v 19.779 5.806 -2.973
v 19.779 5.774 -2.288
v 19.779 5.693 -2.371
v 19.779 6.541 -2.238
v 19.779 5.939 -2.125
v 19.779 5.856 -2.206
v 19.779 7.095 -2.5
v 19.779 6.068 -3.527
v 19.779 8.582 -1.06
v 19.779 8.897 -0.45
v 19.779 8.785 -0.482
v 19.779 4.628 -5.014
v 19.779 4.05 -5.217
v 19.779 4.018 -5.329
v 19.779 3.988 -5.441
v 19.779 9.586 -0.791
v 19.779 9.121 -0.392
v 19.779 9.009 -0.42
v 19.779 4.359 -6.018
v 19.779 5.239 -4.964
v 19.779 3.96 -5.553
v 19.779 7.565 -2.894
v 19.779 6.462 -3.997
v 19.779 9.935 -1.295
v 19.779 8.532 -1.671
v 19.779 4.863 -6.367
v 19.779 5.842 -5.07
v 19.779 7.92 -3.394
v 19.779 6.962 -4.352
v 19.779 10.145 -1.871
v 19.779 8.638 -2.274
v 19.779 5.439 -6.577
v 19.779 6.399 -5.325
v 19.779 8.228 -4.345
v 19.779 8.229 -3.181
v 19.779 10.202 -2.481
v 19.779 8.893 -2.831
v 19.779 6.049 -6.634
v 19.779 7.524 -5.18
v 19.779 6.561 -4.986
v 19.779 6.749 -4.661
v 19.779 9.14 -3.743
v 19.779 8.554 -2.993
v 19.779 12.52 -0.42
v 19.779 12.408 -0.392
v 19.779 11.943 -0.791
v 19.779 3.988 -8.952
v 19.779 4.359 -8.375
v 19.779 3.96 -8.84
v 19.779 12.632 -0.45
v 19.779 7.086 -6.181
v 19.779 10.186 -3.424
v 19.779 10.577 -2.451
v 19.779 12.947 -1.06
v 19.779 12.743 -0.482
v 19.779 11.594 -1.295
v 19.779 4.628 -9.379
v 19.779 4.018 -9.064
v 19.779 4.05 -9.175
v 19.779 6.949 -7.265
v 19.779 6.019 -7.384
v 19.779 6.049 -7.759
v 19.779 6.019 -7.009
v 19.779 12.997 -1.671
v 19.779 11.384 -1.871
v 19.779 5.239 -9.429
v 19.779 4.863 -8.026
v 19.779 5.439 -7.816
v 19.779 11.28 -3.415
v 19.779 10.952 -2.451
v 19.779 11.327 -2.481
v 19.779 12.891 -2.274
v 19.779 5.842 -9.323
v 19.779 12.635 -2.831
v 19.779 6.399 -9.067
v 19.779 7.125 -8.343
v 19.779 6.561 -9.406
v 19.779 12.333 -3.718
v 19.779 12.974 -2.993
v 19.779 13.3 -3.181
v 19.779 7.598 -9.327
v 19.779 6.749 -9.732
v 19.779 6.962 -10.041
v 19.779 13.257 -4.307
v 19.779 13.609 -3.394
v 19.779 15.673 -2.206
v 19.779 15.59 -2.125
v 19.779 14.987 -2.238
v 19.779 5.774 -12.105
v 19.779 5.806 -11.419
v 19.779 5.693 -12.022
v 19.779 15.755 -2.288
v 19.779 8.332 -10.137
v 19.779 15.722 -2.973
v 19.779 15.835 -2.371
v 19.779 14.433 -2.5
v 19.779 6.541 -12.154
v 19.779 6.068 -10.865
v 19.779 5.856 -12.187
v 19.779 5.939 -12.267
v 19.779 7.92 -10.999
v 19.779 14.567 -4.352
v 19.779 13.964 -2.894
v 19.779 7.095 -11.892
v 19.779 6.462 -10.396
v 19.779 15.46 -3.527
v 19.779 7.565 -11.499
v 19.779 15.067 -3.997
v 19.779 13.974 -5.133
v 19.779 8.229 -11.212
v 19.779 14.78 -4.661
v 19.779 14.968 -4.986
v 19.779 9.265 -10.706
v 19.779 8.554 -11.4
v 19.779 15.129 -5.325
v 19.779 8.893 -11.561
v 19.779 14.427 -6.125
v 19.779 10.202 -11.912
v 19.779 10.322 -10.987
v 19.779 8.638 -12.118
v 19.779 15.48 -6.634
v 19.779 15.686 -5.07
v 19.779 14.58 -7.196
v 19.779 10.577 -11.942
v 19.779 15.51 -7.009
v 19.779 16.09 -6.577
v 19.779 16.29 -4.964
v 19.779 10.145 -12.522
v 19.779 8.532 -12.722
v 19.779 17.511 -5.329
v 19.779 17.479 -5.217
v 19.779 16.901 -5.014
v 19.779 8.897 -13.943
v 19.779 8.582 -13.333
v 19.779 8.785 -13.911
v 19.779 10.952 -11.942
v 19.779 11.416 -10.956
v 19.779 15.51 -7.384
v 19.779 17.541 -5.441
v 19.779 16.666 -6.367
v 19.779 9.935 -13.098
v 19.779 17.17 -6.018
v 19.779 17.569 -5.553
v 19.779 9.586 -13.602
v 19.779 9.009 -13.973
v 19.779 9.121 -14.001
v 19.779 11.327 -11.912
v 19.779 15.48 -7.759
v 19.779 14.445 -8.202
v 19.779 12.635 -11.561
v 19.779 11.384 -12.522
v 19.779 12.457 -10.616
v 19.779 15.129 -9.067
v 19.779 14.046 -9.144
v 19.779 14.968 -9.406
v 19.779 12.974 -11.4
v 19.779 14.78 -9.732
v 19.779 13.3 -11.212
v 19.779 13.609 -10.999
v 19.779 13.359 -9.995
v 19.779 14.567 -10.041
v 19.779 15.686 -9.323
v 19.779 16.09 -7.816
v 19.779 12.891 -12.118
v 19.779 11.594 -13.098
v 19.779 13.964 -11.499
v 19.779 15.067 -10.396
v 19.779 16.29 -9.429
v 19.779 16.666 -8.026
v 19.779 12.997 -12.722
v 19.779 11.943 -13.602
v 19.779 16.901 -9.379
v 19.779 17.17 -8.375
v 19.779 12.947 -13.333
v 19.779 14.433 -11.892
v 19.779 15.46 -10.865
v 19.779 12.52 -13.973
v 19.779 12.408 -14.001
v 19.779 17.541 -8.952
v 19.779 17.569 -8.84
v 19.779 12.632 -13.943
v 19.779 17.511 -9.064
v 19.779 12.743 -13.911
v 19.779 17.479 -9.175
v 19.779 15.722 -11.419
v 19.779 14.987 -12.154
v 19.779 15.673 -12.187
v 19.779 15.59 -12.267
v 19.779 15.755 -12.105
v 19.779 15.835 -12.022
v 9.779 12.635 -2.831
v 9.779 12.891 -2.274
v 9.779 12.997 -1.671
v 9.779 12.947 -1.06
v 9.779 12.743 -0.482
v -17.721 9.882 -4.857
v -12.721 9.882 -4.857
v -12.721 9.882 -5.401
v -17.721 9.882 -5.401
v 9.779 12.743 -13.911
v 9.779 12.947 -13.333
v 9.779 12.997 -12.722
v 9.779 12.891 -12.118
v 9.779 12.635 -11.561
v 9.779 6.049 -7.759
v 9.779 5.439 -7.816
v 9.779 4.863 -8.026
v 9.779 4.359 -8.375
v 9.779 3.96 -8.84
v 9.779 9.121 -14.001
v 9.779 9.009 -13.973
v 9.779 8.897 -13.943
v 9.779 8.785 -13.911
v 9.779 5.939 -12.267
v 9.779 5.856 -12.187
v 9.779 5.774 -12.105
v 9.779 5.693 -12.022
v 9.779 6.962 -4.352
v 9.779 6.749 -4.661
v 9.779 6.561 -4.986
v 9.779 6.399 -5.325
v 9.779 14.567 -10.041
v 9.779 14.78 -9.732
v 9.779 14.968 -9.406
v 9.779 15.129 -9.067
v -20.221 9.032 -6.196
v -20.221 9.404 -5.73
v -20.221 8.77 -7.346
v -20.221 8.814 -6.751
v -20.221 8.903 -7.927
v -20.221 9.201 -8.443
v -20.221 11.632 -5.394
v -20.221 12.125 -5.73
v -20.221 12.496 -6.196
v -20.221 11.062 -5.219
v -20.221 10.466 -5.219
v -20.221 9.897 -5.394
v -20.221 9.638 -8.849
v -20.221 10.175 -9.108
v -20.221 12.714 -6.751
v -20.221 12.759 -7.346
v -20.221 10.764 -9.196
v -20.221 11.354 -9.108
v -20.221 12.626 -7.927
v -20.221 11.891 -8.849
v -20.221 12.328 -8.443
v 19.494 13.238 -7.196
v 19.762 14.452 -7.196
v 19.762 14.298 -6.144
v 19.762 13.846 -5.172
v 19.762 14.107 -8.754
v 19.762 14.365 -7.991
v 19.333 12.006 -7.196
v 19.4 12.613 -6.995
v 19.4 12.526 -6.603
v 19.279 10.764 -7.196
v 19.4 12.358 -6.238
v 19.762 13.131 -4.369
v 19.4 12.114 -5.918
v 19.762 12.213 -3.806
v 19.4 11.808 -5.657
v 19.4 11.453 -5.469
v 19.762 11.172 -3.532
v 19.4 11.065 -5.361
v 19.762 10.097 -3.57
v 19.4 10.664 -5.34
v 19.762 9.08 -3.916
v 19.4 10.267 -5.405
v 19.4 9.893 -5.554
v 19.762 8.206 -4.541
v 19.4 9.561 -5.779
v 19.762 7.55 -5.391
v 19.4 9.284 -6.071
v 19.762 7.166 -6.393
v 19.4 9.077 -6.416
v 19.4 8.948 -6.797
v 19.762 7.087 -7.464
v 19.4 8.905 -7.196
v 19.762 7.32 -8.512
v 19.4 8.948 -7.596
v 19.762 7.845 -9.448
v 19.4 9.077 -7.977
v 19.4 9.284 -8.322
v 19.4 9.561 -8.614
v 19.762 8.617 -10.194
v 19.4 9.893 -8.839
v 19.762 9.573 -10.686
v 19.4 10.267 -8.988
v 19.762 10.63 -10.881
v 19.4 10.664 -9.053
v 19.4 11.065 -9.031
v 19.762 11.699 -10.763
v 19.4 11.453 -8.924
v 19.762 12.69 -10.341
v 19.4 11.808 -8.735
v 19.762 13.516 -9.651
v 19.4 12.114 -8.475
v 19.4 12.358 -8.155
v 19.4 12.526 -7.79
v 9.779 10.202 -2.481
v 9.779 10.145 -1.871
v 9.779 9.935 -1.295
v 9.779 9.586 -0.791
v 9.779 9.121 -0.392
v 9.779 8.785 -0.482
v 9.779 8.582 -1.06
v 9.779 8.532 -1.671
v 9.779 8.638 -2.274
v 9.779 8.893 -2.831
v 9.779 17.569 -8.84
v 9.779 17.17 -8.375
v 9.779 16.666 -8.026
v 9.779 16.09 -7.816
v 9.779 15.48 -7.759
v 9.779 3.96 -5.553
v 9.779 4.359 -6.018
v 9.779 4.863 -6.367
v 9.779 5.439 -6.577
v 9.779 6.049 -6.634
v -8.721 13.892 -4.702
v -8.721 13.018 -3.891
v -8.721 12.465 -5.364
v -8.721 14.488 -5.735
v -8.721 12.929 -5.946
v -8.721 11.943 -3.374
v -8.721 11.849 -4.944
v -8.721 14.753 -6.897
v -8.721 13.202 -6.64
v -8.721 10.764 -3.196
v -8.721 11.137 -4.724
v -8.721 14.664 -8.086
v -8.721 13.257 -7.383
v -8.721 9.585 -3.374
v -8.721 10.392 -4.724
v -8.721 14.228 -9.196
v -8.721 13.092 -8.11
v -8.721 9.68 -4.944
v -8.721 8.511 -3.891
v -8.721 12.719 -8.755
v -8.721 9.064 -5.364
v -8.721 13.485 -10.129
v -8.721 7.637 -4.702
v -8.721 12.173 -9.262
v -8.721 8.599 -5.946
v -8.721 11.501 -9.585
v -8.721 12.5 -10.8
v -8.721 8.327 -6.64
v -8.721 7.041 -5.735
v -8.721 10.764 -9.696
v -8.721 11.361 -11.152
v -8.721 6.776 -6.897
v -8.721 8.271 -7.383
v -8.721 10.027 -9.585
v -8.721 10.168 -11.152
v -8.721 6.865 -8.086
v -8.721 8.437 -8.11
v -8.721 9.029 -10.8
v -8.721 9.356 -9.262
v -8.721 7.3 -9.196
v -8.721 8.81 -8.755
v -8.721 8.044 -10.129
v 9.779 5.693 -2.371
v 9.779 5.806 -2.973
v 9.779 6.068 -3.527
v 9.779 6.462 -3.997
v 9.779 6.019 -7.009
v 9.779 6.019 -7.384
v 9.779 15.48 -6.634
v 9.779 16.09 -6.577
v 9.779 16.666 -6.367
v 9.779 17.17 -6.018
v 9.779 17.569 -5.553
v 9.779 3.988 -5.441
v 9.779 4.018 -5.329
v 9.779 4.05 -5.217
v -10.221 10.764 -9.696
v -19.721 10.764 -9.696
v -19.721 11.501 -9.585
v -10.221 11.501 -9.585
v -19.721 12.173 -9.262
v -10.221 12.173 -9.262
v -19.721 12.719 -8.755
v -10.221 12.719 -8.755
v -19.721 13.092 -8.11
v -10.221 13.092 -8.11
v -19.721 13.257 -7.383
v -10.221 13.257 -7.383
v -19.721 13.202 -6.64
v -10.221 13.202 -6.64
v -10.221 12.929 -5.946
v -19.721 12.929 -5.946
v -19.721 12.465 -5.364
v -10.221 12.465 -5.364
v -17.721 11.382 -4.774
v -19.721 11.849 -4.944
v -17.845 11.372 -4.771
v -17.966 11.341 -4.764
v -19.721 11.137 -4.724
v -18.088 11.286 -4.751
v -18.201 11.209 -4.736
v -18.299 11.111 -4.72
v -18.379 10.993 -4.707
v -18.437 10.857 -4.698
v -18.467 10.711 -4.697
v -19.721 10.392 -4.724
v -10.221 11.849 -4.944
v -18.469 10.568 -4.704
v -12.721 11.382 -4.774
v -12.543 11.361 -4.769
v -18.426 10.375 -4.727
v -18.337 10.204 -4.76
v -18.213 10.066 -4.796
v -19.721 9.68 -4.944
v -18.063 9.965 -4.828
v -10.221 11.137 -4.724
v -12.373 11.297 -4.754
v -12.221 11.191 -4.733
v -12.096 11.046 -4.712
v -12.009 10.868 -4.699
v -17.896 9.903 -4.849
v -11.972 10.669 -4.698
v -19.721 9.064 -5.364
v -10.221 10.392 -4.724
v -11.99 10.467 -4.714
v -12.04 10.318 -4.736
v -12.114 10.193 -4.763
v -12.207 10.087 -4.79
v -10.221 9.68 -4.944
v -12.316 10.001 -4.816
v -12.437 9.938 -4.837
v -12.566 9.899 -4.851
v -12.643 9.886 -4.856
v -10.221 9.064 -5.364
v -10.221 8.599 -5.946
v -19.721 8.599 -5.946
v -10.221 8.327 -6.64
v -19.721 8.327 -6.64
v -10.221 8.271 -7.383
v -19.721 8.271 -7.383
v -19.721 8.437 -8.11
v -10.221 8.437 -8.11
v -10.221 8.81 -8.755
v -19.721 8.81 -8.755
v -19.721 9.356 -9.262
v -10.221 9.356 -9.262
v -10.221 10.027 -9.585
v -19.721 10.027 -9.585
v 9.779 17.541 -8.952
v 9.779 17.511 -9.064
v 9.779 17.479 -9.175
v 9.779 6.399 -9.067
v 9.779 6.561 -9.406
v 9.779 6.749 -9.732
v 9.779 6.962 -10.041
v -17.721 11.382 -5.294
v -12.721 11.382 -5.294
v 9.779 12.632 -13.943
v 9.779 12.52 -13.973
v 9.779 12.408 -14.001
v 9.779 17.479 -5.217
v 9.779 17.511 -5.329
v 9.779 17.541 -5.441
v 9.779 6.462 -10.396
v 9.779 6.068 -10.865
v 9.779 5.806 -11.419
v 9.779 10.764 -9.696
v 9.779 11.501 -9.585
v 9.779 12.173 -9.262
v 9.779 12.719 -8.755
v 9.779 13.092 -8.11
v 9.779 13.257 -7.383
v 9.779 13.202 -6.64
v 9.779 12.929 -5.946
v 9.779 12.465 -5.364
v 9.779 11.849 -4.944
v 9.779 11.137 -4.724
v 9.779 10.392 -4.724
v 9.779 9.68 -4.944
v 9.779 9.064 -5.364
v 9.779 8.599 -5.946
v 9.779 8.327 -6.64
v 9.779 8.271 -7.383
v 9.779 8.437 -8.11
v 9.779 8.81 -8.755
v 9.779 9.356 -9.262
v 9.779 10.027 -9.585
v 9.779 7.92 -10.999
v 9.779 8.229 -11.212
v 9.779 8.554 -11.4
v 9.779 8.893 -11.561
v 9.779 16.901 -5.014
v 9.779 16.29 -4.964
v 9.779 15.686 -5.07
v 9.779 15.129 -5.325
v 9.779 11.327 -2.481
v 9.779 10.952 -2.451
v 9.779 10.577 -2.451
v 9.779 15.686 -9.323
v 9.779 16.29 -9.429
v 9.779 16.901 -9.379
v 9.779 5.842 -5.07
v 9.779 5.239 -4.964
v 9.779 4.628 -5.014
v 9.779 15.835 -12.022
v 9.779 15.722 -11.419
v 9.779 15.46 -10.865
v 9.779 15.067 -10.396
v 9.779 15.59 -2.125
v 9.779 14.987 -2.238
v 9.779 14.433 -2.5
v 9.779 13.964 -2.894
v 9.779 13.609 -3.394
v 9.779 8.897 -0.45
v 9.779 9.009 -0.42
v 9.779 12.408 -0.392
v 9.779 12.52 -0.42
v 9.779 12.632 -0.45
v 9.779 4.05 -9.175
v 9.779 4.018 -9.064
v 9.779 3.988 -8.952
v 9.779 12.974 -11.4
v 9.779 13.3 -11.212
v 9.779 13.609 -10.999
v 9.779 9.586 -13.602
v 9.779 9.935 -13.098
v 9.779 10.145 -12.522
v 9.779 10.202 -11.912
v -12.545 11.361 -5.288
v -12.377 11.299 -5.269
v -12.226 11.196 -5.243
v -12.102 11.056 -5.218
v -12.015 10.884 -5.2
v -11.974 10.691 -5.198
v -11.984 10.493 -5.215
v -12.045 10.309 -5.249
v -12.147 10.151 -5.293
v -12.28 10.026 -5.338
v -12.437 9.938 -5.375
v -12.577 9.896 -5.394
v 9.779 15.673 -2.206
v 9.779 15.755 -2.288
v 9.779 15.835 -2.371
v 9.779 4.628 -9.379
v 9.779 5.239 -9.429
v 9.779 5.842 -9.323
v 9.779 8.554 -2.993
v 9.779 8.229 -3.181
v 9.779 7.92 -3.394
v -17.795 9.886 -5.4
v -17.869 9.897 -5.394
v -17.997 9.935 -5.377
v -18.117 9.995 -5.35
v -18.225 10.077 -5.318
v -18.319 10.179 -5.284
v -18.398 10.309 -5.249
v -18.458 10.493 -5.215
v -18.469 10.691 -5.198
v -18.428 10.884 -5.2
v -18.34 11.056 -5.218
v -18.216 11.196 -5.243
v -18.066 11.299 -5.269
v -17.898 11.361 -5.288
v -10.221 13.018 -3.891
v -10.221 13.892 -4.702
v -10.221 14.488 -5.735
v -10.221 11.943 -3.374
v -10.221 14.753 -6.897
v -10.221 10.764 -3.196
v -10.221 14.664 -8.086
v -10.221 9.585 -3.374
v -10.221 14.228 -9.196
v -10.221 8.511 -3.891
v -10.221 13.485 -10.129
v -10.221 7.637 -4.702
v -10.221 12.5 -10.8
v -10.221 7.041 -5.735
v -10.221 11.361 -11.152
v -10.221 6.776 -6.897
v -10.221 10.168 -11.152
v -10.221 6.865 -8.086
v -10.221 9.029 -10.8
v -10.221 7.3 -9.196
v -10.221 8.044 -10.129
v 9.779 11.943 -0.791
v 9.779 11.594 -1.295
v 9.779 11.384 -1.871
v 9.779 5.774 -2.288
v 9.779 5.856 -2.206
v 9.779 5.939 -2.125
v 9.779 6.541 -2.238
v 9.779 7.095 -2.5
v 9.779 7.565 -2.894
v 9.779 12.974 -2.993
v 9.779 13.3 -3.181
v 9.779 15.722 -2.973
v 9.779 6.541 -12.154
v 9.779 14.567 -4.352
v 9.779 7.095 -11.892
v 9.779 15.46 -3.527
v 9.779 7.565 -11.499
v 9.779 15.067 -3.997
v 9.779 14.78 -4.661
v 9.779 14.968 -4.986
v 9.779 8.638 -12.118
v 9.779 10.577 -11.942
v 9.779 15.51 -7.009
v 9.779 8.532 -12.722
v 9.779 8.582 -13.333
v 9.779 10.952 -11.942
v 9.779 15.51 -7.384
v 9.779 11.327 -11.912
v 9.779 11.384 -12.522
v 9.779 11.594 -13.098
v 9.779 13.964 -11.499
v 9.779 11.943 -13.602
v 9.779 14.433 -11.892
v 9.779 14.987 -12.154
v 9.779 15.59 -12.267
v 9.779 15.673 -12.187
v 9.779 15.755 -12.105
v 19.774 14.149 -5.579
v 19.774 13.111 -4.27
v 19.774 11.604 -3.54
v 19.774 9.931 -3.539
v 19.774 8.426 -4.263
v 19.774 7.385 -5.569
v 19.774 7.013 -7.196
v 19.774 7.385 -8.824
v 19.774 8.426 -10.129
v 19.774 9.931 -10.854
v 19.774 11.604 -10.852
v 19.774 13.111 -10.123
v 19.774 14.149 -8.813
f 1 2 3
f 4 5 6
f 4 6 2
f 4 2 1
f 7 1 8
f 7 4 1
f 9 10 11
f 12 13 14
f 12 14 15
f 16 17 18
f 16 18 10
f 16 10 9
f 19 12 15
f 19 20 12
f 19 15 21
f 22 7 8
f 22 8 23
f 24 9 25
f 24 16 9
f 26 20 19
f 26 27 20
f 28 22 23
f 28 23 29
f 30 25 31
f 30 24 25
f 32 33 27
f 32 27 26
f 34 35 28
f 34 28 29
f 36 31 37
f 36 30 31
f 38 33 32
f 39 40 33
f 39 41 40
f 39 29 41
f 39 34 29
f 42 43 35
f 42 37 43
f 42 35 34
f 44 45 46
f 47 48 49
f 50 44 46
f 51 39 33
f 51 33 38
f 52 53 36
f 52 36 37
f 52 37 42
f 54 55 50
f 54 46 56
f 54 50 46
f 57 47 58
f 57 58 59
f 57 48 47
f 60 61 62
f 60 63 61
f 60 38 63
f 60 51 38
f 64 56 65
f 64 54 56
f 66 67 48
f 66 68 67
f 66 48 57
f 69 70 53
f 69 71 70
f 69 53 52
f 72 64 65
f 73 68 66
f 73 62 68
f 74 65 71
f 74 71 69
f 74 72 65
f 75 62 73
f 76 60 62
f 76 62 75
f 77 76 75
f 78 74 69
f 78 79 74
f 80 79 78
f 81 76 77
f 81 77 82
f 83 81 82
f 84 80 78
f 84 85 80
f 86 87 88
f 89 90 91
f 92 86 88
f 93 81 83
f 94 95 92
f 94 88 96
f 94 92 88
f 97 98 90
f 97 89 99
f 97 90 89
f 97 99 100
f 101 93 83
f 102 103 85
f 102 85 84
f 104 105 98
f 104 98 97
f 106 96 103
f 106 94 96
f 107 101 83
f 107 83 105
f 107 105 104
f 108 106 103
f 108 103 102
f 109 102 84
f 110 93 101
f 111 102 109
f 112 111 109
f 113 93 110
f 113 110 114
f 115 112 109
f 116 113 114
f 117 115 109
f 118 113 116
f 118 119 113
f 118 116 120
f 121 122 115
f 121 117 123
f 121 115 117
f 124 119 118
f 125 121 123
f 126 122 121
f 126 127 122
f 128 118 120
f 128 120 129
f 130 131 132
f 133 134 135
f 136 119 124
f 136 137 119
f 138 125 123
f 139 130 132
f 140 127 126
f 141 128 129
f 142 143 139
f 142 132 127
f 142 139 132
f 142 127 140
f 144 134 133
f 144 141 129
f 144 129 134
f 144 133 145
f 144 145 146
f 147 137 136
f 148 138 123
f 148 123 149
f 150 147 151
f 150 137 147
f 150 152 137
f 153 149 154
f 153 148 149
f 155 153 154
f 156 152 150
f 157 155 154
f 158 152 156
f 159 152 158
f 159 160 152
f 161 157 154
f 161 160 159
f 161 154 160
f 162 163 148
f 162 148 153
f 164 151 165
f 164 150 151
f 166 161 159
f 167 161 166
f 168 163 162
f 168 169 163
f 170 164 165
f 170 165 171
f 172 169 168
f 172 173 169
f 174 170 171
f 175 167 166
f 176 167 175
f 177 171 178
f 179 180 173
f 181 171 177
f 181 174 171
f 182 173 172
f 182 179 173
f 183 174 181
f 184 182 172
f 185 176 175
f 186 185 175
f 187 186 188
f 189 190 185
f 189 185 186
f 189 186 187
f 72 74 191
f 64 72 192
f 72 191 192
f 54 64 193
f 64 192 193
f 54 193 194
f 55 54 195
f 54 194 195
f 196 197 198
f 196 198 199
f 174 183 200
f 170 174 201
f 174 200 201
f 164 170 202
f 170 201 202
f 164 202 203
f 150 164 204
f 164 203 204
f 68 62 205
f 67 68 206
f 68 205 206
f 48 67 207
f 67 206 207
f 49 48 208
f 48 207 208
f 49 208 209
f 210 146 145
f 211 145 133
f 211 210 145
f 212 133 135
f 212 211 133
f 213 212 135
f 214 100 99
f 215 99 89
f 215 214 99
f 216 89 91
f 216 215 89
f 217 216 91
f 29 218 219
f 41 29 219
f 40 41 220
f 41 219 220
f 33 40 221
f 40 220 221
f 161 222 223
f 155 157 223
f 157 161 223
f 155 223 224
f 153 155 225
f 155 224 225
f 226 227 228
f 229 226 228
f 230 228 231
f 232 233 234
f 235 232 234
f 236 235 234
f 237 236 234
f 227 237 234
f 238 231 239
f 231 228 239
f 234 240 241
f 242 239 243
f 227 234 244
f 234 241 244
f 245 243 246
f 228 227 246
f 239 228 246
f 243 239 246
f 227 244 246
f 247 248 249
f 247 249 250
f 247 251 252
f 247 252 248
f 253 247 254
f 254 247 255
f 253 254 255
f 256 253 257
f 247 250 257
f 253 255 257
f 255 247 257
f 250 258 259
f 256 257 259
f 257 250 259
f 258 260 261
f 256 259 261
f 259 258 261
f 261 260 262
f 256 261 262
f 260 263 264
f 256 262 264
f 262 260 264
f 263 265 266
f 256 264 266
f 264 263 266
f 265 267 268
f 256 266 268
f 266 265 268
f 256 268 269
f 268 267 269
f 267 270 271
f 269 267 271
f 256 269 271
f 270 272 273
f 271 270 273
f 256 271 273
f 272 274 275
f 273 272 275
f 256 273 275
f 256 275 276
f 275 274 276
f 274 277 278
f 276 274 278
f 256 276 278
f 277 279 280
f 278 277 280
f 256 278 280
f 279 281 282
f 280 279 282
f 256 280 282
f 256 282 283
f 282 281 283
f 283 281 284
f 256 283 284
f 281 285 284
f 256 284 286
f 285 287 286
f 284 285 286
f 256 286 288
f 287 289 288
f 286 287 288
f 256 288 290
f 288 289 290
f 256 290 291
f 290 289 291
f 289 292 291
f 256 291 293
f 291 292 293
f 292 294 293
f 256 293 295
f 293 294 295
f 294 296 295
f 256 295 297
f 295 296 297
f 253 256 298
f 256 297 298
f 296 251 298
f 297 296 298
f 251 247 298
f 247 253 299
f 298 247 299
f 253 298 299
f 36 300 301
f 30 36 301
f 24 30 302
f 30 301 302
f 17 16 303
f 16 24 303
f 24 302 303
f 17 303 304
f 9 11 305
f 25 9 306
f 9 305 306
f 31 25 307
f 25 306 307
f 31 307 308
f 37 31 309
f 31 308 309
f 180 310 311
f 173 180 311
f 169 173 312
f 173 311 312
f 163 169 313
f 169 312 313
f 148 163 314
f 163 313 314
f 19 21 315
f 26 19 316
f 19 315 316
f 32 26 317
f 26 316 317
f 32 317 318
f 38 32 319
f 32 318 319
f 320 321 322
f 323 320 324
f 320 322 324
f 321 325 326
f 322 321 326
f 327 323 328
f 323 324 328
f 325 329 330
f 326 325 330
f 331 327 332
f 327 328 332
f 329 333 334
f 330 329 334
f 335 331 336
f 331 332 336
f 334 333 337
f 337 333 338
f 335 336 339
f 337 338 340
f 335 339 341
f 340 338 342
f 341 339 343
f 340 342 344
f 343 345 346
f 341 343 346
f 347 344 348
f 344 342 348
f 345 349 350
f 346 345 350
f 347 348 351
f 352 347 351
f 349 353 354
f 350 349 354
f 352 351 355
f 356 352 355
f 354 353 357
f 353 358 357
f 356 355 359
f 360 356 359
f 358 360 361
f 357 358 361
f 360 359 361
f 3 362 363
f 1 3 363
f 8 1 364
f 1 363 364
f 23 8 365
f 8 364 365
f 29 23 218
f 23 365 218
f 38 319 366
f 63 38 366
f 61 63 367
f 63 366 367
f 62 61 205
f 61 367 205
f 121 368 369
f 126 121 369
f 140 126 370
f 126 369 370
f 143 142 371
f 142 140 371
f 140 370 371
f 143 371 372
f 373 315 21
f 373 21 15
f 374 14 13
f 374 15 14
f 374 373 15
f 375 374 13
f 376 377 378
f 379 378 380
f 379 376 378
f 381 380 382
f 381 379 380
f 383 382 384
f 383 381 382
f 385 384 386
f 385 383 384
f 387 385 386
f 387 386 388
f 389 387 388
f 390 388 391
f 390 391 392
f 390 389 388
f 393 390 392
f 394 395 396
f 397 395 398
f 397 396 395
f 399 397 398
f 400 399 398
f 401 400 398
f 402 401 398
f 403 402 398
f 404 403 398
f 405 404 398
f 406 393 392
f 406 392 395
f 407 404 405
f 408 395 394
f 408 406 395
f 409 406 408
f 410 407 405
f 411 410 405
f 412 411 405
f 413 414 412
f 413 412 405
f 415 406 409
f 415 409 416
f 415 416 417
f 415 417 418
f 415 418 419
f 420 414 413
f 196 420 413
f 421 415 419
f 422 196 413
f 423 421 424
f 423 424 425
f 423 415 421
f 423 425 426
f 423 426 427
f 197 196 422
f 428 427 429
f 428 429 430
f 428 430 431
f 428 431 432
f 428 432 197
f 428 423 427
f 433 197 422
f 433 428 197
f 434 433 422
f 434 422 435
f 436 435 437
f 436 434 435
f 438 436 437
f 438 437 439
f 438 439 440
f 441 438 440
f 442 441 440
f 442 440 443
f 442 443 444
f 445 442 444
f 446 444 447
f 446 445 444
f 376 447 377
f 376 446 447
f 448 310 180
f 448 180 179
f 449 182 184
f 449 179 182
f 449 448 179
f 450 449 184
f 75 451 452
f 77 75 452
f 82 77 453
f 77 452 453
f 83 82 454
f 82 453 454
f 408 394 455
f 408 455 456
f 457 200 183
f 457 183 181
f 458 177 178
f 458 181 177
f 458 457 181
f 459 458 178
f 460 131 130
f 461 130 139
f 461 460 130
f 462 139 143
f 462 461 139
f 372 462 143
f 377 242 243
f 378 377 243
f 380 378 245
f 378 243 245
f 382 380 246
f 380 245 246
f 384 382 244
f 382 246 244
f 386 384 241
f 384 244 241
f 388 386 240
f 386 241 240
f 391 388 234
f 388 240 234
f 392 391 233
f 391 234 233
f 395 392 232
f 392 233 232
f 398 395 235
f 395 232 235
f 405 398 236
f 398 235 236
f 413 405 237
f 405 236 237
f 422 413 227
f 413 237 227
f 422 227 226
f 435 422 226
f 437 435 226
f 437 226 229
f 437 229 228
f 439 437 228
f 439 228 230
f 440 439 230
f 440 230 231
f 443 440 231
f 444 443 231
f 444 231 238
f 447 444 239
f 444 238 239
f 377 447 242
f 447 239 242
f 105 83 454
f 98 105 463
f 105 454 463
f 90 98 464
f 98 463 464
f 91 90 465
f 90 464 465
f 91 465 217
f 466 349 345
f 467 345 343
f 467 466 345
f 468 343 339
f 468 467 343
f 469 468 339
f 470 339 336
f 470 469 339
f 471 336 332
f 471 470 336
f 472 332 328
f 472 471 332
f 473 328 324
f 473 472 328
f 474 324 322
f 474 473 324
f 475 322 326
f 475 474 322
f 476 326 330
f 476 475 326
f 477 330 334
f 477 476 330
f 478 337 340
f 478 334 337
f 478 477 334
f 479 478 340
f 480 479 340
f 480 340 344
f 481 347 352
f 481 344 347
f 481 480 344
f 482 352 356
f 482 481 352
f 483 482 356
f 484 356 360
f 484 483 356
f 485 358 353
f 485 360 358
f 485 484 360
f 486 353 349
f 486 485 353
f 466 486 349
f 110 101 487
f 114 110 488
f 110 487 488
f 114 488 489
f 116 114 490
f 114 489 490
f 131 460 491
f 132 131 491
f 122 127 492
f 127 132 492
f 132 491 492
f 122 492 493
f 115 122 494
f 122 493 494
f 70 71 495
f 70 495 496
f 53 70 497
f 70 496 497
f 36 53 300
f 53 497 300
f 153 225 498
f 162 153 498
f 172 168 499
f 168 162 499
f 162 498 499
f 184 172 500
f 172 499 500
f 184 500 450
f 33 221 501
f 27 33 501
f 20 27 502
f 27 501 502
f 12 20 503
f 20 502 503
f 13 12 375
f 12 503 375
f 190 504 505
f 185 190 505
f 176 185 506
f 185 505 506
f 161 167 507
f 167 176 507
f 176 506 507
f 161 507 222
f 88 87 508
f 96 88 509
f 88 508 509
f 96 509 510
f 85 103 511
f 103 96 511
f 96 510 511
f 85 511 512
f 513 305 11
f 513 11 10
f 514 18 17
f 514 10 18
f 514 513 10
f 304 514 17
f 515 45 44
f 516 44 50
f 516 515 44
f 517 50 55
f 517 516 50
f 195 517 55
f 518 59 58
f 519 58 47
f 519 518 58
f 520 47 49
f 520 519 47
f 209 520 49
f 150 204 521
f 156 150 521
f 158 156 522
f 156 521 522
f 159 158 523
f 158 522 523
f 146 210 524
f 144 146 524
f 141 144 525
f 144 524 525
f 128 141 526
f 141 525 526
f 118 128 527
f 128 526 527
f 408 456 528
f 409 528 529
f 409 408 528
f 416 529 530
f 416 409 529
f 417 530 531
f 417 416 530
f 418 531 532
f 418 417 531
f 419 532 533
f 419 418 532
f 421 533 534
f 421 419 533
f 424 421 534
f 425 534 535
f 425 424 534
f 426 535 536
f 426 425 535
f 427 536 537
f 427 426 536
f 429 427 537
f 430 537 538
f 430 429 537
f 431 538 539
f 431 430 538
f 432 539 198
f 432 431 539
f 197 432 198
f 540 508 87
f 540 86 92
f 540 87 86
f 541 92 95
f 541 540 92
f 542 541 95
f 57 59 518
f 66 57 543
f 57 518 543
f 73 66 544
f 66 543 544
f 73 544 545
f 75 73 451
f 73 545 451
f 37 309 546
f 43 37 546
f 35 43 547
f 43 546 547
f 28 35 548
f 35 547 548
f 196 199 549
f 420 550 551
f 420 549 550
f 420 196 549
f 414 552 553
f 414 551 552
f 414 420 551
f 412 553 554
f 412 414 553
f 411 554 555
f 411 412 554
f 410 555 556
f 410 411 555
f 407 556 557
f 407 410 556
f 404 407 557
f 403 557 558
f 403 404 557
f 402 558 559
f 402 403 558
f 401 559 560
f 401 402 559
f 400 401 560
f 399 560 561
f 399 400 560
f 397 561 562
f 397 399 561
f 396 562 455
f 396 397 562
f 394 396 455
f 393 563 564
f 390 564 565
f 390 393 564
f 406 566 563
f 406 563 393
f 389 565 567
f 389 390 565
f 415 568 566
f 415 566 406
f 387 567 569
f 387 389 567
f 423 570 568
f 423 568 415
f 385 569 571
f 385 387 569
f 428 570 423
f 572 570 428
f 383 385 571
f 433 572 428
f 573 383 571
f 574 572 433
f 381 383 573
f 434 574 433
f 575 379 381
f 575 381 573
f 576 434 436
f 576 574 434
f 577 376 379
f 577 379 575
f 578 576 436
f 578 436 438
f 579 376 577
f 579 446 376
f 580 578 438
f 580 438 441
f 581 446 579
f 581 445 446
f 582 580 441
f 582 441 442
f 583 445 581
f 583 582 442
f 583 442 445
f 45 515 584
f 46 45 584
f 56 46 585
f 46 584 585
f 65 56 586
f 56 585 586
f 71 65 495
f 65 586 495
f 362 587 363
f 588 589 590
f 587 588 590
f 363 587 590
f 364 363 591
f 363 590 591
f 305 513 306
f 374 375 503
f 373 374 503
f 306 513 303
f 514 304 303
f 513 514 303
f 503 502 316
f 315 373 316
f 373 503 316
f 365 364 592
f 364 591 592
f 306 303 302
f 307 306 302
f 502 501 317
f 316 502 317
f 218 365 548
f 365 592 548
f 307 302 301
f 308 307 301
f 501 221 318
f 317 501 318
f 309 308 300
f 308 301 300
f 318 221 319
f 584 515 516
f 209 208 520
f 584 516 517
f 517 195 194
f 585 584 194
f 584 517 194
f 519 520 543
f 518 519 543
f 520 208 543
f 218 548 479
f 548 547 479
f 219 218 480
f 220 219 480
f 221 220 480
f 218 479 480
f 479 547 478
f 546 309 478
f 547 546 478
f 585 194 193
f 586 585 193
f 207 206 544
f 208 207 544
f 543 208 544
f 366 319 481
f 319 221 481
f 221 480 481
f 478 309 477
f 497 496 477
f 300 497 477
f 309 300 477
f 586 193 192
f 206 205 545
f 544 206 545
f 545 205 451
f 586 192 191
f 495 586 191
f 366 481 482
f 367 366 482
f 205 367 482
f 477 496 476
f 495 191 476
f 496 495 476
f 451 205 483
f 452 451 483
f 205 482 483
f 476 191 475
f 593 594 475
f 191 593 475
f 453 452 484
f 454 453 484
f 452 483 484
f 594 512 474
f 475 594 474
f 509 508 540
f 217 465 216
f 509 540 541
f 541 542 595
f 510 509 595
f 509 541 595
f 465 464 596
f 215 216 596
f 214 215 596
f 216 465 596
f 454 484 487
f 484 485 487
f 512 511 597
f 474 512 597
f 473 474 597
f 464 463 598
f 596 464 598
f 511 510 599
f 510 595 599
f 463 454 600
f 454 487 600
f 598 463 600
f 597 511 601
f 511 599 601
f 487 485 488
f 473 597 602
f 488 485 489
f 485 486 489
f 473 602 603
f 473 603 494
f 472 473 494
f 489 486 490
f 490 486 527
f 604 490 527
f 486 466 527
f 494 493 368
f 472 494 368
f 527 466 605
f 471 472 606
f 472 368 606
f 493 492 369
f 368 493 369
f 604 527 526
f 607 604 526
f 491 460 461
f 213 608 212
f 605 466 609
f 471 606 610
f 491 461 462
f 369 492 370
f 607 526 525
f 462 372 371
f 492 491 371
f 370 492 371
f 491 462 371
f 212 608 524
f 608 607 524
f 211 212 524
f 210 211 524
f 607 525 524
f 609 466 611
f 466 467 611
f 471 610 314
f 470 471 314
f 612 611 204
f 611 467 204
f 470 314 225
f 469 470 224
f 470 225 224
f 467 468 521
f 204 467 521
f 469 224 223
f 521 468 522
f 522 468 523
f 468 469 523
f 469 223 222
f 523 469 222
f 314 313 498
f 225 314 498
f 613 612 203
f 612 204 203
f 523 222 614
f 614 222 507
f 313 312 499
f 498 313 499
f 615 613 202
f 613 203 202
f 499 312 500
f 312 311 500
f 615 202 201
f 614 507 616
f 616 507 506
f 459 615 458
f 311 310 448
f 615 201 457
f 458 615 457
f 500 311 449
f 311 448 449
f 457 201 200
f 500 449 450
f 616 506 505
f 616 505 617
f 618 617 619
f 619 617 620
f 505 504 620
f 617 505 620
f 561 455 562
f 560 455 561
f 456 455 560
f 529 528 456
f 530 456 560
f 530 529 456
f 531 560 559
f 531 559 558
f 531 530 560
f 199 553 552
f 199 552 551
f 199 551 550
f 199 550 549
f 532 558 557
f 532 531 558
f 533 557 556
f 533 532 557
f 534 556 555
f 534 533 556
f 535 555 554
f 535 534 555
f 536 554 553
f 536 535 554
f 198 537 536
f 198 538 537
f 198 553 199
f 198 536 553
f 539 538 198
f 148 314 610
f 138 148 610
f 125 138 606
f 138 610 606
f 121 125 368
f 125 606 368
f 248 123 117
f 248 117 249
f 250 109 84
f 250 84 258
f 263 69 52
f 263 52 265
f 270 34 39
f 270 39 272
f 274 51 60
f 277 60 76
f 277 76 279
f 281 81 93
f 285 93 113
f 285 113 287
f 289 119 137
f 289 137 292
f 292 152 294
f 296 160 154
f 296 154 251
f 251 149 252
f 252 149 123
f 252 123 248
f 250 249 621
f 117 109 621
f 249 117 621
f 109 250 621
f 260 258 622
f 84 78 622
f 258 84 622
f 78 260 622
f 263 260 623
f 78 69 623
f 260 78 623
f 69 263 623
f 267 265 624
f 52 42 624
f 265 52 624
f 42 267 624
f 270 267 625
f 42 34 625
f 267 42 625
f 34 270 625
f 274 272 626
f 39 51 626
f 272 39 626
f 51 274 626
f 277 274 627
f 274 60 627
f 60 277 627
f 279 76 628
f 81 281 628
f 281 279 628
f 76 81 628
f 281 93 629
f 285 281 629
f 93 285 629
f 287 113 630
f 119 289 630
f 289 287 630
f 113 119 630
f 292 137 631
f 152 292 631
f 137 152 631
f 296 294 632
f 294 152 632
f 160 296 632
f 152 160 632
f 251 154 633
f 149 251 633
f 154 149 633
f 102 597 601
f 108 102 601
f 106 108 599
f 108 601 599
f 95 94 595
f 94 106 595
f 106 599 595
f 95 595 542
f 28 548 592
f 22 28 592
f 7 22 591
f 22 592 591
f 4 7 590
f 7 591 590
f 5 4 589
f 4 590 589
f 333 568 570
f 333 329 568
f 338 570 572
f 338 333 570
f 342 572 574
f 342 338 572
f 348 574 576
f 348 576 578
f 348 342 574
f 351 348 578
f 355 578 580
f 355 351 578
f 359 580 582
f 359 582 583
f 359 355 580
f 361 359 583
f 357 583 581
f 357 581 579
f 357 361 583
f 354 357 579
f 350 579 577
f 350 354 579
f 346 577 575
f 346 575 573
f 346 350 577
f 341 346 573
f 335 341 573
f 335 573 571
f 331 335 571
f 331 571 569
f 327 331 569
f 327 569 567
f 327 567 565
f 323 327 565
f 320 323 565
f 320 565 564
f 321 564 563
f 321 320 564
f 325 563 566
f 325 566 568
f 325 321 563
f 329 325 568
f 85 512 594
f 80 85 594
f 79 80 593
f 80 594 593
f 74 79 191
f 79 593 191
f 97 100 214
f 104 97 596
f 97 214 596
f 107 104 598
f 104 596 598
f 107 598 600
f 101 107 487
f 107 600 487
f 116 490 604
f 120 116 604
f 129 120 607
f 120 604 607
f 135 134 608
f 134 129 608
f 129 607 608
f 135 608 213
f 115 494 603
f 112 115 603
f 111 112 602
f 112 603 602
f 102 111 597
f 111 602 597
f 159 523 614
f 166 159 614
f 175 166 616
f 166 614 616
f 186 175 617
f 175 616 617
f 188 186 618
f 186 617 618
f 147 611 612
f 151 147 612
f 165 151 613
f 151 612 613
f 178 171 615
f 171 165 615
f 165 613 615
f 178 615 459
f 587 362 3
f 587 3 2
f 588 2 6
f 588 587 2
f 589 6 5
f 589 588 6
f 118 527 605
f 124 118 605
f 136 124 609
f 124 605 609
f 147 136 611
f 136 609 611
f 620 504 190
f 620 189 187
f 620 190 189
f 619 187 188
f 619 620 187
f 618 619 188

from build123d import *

# Parameters (mm, degrees)
SKETCH1_W                  = 10
SKETCH1_H                  = 7
CUT_EXTRUDE1_DEPTH         = 25.841675415
CUT_EXTRUDE2_DEPTH         = 25.841675415
CUT_EXTRUDE3_DEPTH         = 25.841675415
CUT_EXTRUDE4_DEPTH         = 25.841675415
CUT_EXTRUDE5_DEPTH         = 25.841675415
CUT_EXTRUDE6_DEPTH         = 25.841675415
CUT_EXTRUDE7_DEPTH         = 25.841675415
CUT_EXTRUDE8_DEPTH         = 25.841675415
CUT_EXTRUDE9_DEPTH         = 25.73038126
CUT_EXTRUDE10_DEPTH        = 25.73038126
CUT_EXTRUDE11_DEPTH        = 25.73038126
CUT_EXTRUDE12_DEPTH        = 25.590210189
SKETCH14_W                 = 30.0000508
SKETCH14_H                 = 2.5
F_0_8_0_8_DIAMETER_HOLE1_D = 0.8
BOSS_EXTRUDE1_START        = -40.0000508
SKETCH17_R                 = 0.4
BOSS_EXTRUDE1_DEPTH        = 40.0000508
SKETCH18_W                 = 1.5
SKETCH18_H                 = 1.5
CHAMFER1_SIZE              = 0.5
CUT_EXTRUDE13_REACH        = 34.638
CUT_EXTRUDE13_END_RADIUS   = 2
CUT_EXTRUDE13_START        = 5
FILLET1_R                  = 0.5


# Read off the part's stored shape, not the designer's step: Dome1
with BuildPart() as part:
    # Sketch1 → Revolve1 (revolve)
    with BuildSketch(Plane(origin=(0, 0, -7.196357143), x_dir=(-1, 0, 0), z_dir=(0, 0, -1)), mode=Mode.PRIVATE) as revolve1_sk:
        with Locations((-14.77870785, 14.264354232)):
            Rectangle(SKETCH1_W, SKETCH1_H)
    revolve(revolve1_sk.sketch.rotate(Axis((19.77870785, 10.764354232, -7.196357143), (-1, 0, 0)), 270), axis=Axis((19.77870785, 10.764354232, -7.196357143), (-1, 0, 0)))

    # Sketch2 → Cut-Extrude1 (cut, through all)
    with BuildSketch(Plane.ZY.offset(-9.77870785)):
        with BuildLine():
            ThreePointArc((-0.481894482, 12.743240579), (-1.134179317, 14.264354232), (-2.125359964, 15.589806295))
            ThreePointArc((-2.125359964, 15.589806295), (-2.500220073, 14.433413298), (-3.393627672, 13.609042188))
            ThreePointArc((-3.393627672, 13.609042188), (-3.083602501, 13.138854232), (-2.831420372, 12.635270579))
            ThreePointArc((-2.831420372, 12.635270579), (-1.670790249, 12.996798701), (-0.481894482, 12.743240579))
        make_face()
    extrude(amount=-CUT_EXTRUDE1_DEPTH, mode=Mode.SUBTRACT)

    # Sketch3 → Cut-Extrude2 (cut, through all)
    with BuildSketch(Plane.ZY.offset(-9.77870785)):
        with BuildLine():
            ThreePointArc((-0.392018732, 9.12088875), (-0.196357143, 10.764354232), (-0.392018732, 12.407819713))
            ThreePointArc((-0.392018732, 12.407819713), (-1.294853608, 11.593784056), (-2.480752839, 11.326561532))
            ThreePointArc((-2.480752839, 11.326561532), (-2.447357143, 10.764354232), (-2.480752839, 10.202146931))
            ThreePointArc((-2.480752839, 10.202146931), (-1.294853608, 9.934924408), (-0.392018732, 9.12088875))
        make_face()
    extrude(amount=-CUT_EXTRUDE2_DEPTH, mode=Mode.SUBTRACT)

    # Sketch4 → Cut-Extrude3 (cut, through all)
    with BuildSketch(Plane.ZY.offset(-9.77870785)):
        with BuildLine():
            ThreePointArc((-2.125359964, 5.938902169), (-1.134179317, 7.264354232), (-0.481894482, 8.785467884))
            ThreePointArc((-0.481894482, 8.785467884), (-1.670790249, 8.531909762), (-2.831420372, 8.893437884))
            ThreePointArc((-2.831420372, 8.893437884), (-3.083602501, 8.389854232), (-3.393627672, 7.919666275))
            ThreePointArc((-3.393627672, 7.919666275), (-2.500220073, 7.095295166), (-2.125359964, 5.938902169))
        make_face()
    extrude(amount=-CUT_EXTRUDE3_DEPTH, mode=Mode.SUBTRACT)

    # Sketch5 → Cut-Extrude4 (cut, through all)
    with BuildSketch(Plane.ZY.offset(-9.77870785)):
        with BuildLine():
            ThreePointArc((-5.217470795, 4.049891571), (-3.696357143, 4.702176405), (-2.37090508, 5.693357053))
            ThreePointArc((-2.37090508, 5.693357053), (-3.527298077, 6.068217161), (-4.351669187, 6.96162476))
            ThreePointArc((-4.351669187, 6.96162476), (-4.821857143, 6.651599589), (-5.325440796, 6.39941746))
            ThreePointArc((-5.325440796, 6.39941746), (-4.963912674, 5.238787337), (-5.217470795, 4.049891571))
        make_face()
    extrude(amount=-CUT_EXTRUDE4_DEPTH, mode=Mode.SUBTRACT)

    # Sketch6 → Cut-Extrude5 (cut, through all)
    with BuildSketch(Plane.ZY.offset(-9.77870785)):
        with BuildLine():
            ThreePointArc((-8.839822625, 3.960015821), (-7.196357143, 3.764354232), (-5.552891661, 3.960015821))
            ThreePointArc((-5.552891661, 3.960015821), (-6.366927319, 4.862850696), (-6.634149843, 6.048749928))
            ThreePointArc((-6.634149843, 6.048749928), (-7.196357143, 6.015354232), (-7.758564444, 6.048749928))
            ThreePointArc((-7.758564444, 6.048749928), (-8.025786967, 4.862850696), (-8.839822625, 3.960015821))
        make_face()
    extrude(amount=-CUT_EXTRUDE5_DEPTH, mode=Mode.SUBTRACT)

    # Sketch7 → Cut-Extrude6 (cut, through all)
    with BuildSketch(Plane.ZY.offset(-9.77870785)):
        with BuildLine():
            ThreePointArc((-12.021809206, 5.693357053), (-10.696357143, 4.702176405), (-9.175243491, 4.049891571))
            ThreePointArc((-9.175243491, 4.049891571), (-9.428801613, 5.238787337), (-9.067273491, 6.39941746))
            ThreePointArc((-9.067273491, 6.39941746), (-9.570857143, 6.651599589), (-10.0410451, 6.96162476))
            ThreePointArc((-10.0410451, 6.96162476), (-10.865416209, 6.068217161), (-12.021809206, 5.693357053))
        make_face()
    extrude(amount=-CUT_EXTRUDE6_DEPTH, mode=Mode.SUBTRACT)

    # Sketch8 → Cut-Extrude7 (cut, through all)
    with BuildSketch(Plane.ZY.offset(-9.77870785)):
        with BuildLine():
            ThreePointArc((-13.910819804, 8.785467884), (-13.25853497, 7.264354232), (-12.267354322, 5.938902169))
            ThreePointArc((-12.267354322, 5.938902169), (-11.892494213, 7.095295166), (-10.999086614, 7.919666275))
            ThreePointArc((-10.999086614, 7.919666275), (-11.309111786, 8.389854232), (-11.561293915, 8.893437884))
            ThreePointArc((-11.561293915, 8.893437884), (-12.721924037, 8.531909762), (-13.910819804, 8.785467884))
        make_face()
    extrude(amount=-CUT_EXTRUDE7_DEPTH, mode=Mode.SUBTRACT)

    # Sketch9 → Cut-Extrude8 (cut, through all)
    with BuildSketch(Plane.ZY.offset(-9.77870785)):
        with BuildLine():
            ThreePointArc((-14.000695554, 12.407819713), (-14.196357143, 10.764354232), (-14.000695554, 9.12088875))
            ThreePointArc((-14.000695554, 9.12088875), (-13.097860679, 9.934924408), (-11.911961447, 10.202146931))
            ThreePointArc((-11.911961447, 10.202146931), (-11.945357143, 10.764354232), (-11.911961447, 11.326561532))
            ThreePointArc((-11.911961447, 11.326561532), (-13.097860679, 11.593784056), (-14.000695554, 12.407819713))
        make_face()
    extrude(amount=-CUT_EXTRUDE8_DEPTH, mode=Mode.SUBTRACT)

    # Sketch10 → Cut-Extrude9 (cut, through all)
    with BuildSketch(Plane.ZY.offset(-9.77870785)):
        with BuildLine():
            ThreePointArc((-12.267354322, 15.589806295), (-13.25853497, 14.264354232), (-13.910819804, 12.743240579))
            ThreePointArc((-13.910819804, 12.743240579), (-12.721924037, 12.996798701), (-11.561293915, 12.635270579))
            ThreePointArc((-11.561293915, 12.635270579), (-11.309111786, 13.138854232), (-10.999086614, 13.609042188))
            ThreePointArc((-10.999086614, 13.609042188), (-11.892494213, 14.433413298), (-12.267354322, 15.589806295))
        make_face()
    extrude(amount=-CUT_EXTRUDE9_DEPTH, mode=Mode.SUBTRACT)

    # Sketch11 → Cut-Extrude10 (cut, through all)
    with BuildSketch(Plane.ZY.offset(-9.77870785)):
        with BuildLine():
            ThreePointArc((-9.175243491, 17.478816892), (-10.696357143, 16.826532058), (-12.021809206, 15.83535141))
            ThreePointArc((-12.021809206, 15.83535141), (-10.865416209, 15.460491302), (-10.0410451, 14.567083703))
            ThreePointArc((-10.0410451, 14.567083703), (-9.570857143, 14.877108874), (-9.067273491, 15.129291003))
            ThreePointArc((-9.067273491, 15.129291003), (-9.428801613, 16.289921126), (-9.175243491, 17.478816892))
        make_face()
    extrude(amount=-CUT_EXTRUDE10_DEPTH, mode=Mode.SUBTRACT)

    # Sketch12 → Cut-Extrude11 (cut, through all)
    with BuildSketch(Plane.ZY.offset(-9.77870785)):
        with BuildLine():
            ThreePointArc((-5.552891661, 17.568692642), (-7.196357143, 17.764354232), (-8.839822625, 17.568692642))
            ThreePointArc((-8.839822625, 17.568692642), (-8.025786967, 16.665857767), (-7.758564444, 15.479958536))
            ThreePointArc((-7.758564444, 15.479958536), (-7.196357143, 15.513354232), (-6.634149843, 15.479958536))
            ThreePointArc((-6.634149843, 15.479958536), (-6.366927319, 16.665857767), (-5.552891661, 17.568692642))
        make_face()
    extrude(amount=-CUT_EXTRUDE11_DEPTH, mode=Mode.SUBTRACT)

    # Sketch13 → Cut-Extrude12 (cut, through all)
    with BuildSketch(Plane.ZY.offset(-9.77870785)):
        with BuildLine():
            ThreePointArc((-2.37090508, 15.83535141), (-3.696357143, 16.826532058), (-5.217470795, 17.478816892))
            ThreePointArc((-5.217470795, 17.478816892), (-4.963912674, 16.289921126), (-5.325440796, 15.129291003))
            ThreePointArc((-5.325440796, 15.129291003), (-4.821857143, 14.877108874), (-4.351669187, 14.567083703))
            ThreePointArc((-4.351669187, 14.567083703), (-3.527298077, 15.460491302), (-2.37090508, 15.83535141))
        make_face()
    extrude(amount=-CUT_EXTRUDE12_DEPTH, mode=Mode.SUBTRACT)

    # Sketch14 → Revolve2 (revolve)
    with BuildSketch(Plane.XY.offset(-7.196357143), mode=Mode.PRIVATE) as revolve2_sk:
        with Locations((-5.22131755, 12.014354232)):
            Rectangle(SKETCH14_W, SKETCH14_H)
    revolve(revolve2_sk.sketch.rotate(Axis((-20.22134295, 10.764354232, -7.196357143), (1, 0, 0)), 270), axis=Axis((-20.22134295, 10.764354232, -7.196357143), (1, 0, 0)))

    # Ø0.8 (0.8) Diameter Hole1 (through all)
    with Locations(Plane(origin=(19.77870785, 0, 0), x_dir=(0, 0, -1), z_dir=(1, 0, 0))):
        with Locations((7.196357143, 10.764354232)):
            Hole(F_0_8_0_8_DIAMETER_HOLE1_D / 2)

    # Sketch17 → Boss-Extrude1 (add)
    with BuildSketch(Plane(origin=(19.77870785, 0, 0), x_dir=(0, 0, -1), z_dir=(1, 0, 0)).offset(BOSS_EXTRUDE1_START)):
        with Locations((7.196357143, 10.764354232)):
            Circle(SKETCH17_R)
    extrude(amount=BOSS_EXTRUDE1_DEPTH)

    # Sketch18 → Revolve3 (revolve)
    with BuildSketch(Plane.XY.offset(-7.196357143), mode=Mode.PRIVATE) as revolve3_sk:
        with Locations((-9.47134295, 14.014354232)):
            Rectangle(SKETCH18_W, SKETCH18_H)
    revolve(revolve3_sk.sketch.rotate(Axis((-20.22134295, 10.764354232, -7.196357143), (1, 0, 0)), 90), axis=Axis((-20.22134295, 10.764354232, -7.196357143), (1, 0, 0)))

    # Chamfer1
    chamfer1_edges = [part.edges().sort_by_distance(p)[0] for p in [
        (-20.22134295, 10.764354232, -4.696357143),
    ]]
    chamfer(chamfer1_edges, length=CHAMFER1_SIZE)

    # Cut-Extrude13: up to this cylinder (the profile starts outside it)
    cut_extrude13_end = Plane(origin=(-15.221343, 10.764354232, -7.196357143), z_dir=(1, 0, 0)) * Cylinder(CUT_EXTRUDE13_END_RADIUS, 74.276, mode=Mode.PRIVATE)
    # Sketch20 → Cut-Extrude13 (cut, up to the surface)
    with BuildSketch(Plane.XY.offset(-7.196357143).offset(CUT_EXTRUDE13_START), mode=Mode.PRIVATE) as cut_extrude13_sk1:
        with BuildLine():
            Line((-12.72134295, 9.882388481), (-17.72134295, 9.882388481))
            ThreePointArc((-17.72134295, 9.882388481), (-18.47134295, 10.632388481), (-17.72134295, 11.382388481))
            Line((-17.72134295, 11.382388481), (-12.72134295, 11.382388481))
            ThreePointArc((-12.72134295, 11.382388481), (-11.97134295, 10.632388481), (-12.72134295, 9.882388481))
        make_face()
    cut_extrude13_tool1 = extrude(cut_extrude13_sk1.sketch, amount=-CUT_EXTRUDE13_REACH, mode=Mode.PRIVATE) - cut_extrude13_end
    add(cut_extrude13_tool1.solids().sort_by_distance((-15.221343, 10.632388, -2.196357))[0], mode=Mode.SUBTRACT)

    # Dome1 outline → Dome1 (revolve, cut)
    with BuildSketch(Plane(origin=(0, 10.764354232, -7.196357143), x_dir=(0, 1, 0), z_dir=(0, 0, -1))):
        with BuildLine():
            Line((0, 19.778707854), (0, 19.27870785))
            ThreePointArc((0, 19.27870785), (1.891593251, 19.404258523), (3.750000014, 19.778707854))
            Line((3.750000014, 19.778707854), (0, 19.778707854))
        make_face()
    revolve(axis=Axis((0, 10.764354232, -7.196357143), (1, 0, 0)), mode=Mode.SUBTRACT)

    # Fillet1
    fillet1_edges = [part.edges().sort_by_distance(p)[0] for p in [
        (19.778707854, 7.014354218, -7.196357143),
    ]]
    fillet(fillet1_edges, radius=FILLET1_R)


solid = part.part
